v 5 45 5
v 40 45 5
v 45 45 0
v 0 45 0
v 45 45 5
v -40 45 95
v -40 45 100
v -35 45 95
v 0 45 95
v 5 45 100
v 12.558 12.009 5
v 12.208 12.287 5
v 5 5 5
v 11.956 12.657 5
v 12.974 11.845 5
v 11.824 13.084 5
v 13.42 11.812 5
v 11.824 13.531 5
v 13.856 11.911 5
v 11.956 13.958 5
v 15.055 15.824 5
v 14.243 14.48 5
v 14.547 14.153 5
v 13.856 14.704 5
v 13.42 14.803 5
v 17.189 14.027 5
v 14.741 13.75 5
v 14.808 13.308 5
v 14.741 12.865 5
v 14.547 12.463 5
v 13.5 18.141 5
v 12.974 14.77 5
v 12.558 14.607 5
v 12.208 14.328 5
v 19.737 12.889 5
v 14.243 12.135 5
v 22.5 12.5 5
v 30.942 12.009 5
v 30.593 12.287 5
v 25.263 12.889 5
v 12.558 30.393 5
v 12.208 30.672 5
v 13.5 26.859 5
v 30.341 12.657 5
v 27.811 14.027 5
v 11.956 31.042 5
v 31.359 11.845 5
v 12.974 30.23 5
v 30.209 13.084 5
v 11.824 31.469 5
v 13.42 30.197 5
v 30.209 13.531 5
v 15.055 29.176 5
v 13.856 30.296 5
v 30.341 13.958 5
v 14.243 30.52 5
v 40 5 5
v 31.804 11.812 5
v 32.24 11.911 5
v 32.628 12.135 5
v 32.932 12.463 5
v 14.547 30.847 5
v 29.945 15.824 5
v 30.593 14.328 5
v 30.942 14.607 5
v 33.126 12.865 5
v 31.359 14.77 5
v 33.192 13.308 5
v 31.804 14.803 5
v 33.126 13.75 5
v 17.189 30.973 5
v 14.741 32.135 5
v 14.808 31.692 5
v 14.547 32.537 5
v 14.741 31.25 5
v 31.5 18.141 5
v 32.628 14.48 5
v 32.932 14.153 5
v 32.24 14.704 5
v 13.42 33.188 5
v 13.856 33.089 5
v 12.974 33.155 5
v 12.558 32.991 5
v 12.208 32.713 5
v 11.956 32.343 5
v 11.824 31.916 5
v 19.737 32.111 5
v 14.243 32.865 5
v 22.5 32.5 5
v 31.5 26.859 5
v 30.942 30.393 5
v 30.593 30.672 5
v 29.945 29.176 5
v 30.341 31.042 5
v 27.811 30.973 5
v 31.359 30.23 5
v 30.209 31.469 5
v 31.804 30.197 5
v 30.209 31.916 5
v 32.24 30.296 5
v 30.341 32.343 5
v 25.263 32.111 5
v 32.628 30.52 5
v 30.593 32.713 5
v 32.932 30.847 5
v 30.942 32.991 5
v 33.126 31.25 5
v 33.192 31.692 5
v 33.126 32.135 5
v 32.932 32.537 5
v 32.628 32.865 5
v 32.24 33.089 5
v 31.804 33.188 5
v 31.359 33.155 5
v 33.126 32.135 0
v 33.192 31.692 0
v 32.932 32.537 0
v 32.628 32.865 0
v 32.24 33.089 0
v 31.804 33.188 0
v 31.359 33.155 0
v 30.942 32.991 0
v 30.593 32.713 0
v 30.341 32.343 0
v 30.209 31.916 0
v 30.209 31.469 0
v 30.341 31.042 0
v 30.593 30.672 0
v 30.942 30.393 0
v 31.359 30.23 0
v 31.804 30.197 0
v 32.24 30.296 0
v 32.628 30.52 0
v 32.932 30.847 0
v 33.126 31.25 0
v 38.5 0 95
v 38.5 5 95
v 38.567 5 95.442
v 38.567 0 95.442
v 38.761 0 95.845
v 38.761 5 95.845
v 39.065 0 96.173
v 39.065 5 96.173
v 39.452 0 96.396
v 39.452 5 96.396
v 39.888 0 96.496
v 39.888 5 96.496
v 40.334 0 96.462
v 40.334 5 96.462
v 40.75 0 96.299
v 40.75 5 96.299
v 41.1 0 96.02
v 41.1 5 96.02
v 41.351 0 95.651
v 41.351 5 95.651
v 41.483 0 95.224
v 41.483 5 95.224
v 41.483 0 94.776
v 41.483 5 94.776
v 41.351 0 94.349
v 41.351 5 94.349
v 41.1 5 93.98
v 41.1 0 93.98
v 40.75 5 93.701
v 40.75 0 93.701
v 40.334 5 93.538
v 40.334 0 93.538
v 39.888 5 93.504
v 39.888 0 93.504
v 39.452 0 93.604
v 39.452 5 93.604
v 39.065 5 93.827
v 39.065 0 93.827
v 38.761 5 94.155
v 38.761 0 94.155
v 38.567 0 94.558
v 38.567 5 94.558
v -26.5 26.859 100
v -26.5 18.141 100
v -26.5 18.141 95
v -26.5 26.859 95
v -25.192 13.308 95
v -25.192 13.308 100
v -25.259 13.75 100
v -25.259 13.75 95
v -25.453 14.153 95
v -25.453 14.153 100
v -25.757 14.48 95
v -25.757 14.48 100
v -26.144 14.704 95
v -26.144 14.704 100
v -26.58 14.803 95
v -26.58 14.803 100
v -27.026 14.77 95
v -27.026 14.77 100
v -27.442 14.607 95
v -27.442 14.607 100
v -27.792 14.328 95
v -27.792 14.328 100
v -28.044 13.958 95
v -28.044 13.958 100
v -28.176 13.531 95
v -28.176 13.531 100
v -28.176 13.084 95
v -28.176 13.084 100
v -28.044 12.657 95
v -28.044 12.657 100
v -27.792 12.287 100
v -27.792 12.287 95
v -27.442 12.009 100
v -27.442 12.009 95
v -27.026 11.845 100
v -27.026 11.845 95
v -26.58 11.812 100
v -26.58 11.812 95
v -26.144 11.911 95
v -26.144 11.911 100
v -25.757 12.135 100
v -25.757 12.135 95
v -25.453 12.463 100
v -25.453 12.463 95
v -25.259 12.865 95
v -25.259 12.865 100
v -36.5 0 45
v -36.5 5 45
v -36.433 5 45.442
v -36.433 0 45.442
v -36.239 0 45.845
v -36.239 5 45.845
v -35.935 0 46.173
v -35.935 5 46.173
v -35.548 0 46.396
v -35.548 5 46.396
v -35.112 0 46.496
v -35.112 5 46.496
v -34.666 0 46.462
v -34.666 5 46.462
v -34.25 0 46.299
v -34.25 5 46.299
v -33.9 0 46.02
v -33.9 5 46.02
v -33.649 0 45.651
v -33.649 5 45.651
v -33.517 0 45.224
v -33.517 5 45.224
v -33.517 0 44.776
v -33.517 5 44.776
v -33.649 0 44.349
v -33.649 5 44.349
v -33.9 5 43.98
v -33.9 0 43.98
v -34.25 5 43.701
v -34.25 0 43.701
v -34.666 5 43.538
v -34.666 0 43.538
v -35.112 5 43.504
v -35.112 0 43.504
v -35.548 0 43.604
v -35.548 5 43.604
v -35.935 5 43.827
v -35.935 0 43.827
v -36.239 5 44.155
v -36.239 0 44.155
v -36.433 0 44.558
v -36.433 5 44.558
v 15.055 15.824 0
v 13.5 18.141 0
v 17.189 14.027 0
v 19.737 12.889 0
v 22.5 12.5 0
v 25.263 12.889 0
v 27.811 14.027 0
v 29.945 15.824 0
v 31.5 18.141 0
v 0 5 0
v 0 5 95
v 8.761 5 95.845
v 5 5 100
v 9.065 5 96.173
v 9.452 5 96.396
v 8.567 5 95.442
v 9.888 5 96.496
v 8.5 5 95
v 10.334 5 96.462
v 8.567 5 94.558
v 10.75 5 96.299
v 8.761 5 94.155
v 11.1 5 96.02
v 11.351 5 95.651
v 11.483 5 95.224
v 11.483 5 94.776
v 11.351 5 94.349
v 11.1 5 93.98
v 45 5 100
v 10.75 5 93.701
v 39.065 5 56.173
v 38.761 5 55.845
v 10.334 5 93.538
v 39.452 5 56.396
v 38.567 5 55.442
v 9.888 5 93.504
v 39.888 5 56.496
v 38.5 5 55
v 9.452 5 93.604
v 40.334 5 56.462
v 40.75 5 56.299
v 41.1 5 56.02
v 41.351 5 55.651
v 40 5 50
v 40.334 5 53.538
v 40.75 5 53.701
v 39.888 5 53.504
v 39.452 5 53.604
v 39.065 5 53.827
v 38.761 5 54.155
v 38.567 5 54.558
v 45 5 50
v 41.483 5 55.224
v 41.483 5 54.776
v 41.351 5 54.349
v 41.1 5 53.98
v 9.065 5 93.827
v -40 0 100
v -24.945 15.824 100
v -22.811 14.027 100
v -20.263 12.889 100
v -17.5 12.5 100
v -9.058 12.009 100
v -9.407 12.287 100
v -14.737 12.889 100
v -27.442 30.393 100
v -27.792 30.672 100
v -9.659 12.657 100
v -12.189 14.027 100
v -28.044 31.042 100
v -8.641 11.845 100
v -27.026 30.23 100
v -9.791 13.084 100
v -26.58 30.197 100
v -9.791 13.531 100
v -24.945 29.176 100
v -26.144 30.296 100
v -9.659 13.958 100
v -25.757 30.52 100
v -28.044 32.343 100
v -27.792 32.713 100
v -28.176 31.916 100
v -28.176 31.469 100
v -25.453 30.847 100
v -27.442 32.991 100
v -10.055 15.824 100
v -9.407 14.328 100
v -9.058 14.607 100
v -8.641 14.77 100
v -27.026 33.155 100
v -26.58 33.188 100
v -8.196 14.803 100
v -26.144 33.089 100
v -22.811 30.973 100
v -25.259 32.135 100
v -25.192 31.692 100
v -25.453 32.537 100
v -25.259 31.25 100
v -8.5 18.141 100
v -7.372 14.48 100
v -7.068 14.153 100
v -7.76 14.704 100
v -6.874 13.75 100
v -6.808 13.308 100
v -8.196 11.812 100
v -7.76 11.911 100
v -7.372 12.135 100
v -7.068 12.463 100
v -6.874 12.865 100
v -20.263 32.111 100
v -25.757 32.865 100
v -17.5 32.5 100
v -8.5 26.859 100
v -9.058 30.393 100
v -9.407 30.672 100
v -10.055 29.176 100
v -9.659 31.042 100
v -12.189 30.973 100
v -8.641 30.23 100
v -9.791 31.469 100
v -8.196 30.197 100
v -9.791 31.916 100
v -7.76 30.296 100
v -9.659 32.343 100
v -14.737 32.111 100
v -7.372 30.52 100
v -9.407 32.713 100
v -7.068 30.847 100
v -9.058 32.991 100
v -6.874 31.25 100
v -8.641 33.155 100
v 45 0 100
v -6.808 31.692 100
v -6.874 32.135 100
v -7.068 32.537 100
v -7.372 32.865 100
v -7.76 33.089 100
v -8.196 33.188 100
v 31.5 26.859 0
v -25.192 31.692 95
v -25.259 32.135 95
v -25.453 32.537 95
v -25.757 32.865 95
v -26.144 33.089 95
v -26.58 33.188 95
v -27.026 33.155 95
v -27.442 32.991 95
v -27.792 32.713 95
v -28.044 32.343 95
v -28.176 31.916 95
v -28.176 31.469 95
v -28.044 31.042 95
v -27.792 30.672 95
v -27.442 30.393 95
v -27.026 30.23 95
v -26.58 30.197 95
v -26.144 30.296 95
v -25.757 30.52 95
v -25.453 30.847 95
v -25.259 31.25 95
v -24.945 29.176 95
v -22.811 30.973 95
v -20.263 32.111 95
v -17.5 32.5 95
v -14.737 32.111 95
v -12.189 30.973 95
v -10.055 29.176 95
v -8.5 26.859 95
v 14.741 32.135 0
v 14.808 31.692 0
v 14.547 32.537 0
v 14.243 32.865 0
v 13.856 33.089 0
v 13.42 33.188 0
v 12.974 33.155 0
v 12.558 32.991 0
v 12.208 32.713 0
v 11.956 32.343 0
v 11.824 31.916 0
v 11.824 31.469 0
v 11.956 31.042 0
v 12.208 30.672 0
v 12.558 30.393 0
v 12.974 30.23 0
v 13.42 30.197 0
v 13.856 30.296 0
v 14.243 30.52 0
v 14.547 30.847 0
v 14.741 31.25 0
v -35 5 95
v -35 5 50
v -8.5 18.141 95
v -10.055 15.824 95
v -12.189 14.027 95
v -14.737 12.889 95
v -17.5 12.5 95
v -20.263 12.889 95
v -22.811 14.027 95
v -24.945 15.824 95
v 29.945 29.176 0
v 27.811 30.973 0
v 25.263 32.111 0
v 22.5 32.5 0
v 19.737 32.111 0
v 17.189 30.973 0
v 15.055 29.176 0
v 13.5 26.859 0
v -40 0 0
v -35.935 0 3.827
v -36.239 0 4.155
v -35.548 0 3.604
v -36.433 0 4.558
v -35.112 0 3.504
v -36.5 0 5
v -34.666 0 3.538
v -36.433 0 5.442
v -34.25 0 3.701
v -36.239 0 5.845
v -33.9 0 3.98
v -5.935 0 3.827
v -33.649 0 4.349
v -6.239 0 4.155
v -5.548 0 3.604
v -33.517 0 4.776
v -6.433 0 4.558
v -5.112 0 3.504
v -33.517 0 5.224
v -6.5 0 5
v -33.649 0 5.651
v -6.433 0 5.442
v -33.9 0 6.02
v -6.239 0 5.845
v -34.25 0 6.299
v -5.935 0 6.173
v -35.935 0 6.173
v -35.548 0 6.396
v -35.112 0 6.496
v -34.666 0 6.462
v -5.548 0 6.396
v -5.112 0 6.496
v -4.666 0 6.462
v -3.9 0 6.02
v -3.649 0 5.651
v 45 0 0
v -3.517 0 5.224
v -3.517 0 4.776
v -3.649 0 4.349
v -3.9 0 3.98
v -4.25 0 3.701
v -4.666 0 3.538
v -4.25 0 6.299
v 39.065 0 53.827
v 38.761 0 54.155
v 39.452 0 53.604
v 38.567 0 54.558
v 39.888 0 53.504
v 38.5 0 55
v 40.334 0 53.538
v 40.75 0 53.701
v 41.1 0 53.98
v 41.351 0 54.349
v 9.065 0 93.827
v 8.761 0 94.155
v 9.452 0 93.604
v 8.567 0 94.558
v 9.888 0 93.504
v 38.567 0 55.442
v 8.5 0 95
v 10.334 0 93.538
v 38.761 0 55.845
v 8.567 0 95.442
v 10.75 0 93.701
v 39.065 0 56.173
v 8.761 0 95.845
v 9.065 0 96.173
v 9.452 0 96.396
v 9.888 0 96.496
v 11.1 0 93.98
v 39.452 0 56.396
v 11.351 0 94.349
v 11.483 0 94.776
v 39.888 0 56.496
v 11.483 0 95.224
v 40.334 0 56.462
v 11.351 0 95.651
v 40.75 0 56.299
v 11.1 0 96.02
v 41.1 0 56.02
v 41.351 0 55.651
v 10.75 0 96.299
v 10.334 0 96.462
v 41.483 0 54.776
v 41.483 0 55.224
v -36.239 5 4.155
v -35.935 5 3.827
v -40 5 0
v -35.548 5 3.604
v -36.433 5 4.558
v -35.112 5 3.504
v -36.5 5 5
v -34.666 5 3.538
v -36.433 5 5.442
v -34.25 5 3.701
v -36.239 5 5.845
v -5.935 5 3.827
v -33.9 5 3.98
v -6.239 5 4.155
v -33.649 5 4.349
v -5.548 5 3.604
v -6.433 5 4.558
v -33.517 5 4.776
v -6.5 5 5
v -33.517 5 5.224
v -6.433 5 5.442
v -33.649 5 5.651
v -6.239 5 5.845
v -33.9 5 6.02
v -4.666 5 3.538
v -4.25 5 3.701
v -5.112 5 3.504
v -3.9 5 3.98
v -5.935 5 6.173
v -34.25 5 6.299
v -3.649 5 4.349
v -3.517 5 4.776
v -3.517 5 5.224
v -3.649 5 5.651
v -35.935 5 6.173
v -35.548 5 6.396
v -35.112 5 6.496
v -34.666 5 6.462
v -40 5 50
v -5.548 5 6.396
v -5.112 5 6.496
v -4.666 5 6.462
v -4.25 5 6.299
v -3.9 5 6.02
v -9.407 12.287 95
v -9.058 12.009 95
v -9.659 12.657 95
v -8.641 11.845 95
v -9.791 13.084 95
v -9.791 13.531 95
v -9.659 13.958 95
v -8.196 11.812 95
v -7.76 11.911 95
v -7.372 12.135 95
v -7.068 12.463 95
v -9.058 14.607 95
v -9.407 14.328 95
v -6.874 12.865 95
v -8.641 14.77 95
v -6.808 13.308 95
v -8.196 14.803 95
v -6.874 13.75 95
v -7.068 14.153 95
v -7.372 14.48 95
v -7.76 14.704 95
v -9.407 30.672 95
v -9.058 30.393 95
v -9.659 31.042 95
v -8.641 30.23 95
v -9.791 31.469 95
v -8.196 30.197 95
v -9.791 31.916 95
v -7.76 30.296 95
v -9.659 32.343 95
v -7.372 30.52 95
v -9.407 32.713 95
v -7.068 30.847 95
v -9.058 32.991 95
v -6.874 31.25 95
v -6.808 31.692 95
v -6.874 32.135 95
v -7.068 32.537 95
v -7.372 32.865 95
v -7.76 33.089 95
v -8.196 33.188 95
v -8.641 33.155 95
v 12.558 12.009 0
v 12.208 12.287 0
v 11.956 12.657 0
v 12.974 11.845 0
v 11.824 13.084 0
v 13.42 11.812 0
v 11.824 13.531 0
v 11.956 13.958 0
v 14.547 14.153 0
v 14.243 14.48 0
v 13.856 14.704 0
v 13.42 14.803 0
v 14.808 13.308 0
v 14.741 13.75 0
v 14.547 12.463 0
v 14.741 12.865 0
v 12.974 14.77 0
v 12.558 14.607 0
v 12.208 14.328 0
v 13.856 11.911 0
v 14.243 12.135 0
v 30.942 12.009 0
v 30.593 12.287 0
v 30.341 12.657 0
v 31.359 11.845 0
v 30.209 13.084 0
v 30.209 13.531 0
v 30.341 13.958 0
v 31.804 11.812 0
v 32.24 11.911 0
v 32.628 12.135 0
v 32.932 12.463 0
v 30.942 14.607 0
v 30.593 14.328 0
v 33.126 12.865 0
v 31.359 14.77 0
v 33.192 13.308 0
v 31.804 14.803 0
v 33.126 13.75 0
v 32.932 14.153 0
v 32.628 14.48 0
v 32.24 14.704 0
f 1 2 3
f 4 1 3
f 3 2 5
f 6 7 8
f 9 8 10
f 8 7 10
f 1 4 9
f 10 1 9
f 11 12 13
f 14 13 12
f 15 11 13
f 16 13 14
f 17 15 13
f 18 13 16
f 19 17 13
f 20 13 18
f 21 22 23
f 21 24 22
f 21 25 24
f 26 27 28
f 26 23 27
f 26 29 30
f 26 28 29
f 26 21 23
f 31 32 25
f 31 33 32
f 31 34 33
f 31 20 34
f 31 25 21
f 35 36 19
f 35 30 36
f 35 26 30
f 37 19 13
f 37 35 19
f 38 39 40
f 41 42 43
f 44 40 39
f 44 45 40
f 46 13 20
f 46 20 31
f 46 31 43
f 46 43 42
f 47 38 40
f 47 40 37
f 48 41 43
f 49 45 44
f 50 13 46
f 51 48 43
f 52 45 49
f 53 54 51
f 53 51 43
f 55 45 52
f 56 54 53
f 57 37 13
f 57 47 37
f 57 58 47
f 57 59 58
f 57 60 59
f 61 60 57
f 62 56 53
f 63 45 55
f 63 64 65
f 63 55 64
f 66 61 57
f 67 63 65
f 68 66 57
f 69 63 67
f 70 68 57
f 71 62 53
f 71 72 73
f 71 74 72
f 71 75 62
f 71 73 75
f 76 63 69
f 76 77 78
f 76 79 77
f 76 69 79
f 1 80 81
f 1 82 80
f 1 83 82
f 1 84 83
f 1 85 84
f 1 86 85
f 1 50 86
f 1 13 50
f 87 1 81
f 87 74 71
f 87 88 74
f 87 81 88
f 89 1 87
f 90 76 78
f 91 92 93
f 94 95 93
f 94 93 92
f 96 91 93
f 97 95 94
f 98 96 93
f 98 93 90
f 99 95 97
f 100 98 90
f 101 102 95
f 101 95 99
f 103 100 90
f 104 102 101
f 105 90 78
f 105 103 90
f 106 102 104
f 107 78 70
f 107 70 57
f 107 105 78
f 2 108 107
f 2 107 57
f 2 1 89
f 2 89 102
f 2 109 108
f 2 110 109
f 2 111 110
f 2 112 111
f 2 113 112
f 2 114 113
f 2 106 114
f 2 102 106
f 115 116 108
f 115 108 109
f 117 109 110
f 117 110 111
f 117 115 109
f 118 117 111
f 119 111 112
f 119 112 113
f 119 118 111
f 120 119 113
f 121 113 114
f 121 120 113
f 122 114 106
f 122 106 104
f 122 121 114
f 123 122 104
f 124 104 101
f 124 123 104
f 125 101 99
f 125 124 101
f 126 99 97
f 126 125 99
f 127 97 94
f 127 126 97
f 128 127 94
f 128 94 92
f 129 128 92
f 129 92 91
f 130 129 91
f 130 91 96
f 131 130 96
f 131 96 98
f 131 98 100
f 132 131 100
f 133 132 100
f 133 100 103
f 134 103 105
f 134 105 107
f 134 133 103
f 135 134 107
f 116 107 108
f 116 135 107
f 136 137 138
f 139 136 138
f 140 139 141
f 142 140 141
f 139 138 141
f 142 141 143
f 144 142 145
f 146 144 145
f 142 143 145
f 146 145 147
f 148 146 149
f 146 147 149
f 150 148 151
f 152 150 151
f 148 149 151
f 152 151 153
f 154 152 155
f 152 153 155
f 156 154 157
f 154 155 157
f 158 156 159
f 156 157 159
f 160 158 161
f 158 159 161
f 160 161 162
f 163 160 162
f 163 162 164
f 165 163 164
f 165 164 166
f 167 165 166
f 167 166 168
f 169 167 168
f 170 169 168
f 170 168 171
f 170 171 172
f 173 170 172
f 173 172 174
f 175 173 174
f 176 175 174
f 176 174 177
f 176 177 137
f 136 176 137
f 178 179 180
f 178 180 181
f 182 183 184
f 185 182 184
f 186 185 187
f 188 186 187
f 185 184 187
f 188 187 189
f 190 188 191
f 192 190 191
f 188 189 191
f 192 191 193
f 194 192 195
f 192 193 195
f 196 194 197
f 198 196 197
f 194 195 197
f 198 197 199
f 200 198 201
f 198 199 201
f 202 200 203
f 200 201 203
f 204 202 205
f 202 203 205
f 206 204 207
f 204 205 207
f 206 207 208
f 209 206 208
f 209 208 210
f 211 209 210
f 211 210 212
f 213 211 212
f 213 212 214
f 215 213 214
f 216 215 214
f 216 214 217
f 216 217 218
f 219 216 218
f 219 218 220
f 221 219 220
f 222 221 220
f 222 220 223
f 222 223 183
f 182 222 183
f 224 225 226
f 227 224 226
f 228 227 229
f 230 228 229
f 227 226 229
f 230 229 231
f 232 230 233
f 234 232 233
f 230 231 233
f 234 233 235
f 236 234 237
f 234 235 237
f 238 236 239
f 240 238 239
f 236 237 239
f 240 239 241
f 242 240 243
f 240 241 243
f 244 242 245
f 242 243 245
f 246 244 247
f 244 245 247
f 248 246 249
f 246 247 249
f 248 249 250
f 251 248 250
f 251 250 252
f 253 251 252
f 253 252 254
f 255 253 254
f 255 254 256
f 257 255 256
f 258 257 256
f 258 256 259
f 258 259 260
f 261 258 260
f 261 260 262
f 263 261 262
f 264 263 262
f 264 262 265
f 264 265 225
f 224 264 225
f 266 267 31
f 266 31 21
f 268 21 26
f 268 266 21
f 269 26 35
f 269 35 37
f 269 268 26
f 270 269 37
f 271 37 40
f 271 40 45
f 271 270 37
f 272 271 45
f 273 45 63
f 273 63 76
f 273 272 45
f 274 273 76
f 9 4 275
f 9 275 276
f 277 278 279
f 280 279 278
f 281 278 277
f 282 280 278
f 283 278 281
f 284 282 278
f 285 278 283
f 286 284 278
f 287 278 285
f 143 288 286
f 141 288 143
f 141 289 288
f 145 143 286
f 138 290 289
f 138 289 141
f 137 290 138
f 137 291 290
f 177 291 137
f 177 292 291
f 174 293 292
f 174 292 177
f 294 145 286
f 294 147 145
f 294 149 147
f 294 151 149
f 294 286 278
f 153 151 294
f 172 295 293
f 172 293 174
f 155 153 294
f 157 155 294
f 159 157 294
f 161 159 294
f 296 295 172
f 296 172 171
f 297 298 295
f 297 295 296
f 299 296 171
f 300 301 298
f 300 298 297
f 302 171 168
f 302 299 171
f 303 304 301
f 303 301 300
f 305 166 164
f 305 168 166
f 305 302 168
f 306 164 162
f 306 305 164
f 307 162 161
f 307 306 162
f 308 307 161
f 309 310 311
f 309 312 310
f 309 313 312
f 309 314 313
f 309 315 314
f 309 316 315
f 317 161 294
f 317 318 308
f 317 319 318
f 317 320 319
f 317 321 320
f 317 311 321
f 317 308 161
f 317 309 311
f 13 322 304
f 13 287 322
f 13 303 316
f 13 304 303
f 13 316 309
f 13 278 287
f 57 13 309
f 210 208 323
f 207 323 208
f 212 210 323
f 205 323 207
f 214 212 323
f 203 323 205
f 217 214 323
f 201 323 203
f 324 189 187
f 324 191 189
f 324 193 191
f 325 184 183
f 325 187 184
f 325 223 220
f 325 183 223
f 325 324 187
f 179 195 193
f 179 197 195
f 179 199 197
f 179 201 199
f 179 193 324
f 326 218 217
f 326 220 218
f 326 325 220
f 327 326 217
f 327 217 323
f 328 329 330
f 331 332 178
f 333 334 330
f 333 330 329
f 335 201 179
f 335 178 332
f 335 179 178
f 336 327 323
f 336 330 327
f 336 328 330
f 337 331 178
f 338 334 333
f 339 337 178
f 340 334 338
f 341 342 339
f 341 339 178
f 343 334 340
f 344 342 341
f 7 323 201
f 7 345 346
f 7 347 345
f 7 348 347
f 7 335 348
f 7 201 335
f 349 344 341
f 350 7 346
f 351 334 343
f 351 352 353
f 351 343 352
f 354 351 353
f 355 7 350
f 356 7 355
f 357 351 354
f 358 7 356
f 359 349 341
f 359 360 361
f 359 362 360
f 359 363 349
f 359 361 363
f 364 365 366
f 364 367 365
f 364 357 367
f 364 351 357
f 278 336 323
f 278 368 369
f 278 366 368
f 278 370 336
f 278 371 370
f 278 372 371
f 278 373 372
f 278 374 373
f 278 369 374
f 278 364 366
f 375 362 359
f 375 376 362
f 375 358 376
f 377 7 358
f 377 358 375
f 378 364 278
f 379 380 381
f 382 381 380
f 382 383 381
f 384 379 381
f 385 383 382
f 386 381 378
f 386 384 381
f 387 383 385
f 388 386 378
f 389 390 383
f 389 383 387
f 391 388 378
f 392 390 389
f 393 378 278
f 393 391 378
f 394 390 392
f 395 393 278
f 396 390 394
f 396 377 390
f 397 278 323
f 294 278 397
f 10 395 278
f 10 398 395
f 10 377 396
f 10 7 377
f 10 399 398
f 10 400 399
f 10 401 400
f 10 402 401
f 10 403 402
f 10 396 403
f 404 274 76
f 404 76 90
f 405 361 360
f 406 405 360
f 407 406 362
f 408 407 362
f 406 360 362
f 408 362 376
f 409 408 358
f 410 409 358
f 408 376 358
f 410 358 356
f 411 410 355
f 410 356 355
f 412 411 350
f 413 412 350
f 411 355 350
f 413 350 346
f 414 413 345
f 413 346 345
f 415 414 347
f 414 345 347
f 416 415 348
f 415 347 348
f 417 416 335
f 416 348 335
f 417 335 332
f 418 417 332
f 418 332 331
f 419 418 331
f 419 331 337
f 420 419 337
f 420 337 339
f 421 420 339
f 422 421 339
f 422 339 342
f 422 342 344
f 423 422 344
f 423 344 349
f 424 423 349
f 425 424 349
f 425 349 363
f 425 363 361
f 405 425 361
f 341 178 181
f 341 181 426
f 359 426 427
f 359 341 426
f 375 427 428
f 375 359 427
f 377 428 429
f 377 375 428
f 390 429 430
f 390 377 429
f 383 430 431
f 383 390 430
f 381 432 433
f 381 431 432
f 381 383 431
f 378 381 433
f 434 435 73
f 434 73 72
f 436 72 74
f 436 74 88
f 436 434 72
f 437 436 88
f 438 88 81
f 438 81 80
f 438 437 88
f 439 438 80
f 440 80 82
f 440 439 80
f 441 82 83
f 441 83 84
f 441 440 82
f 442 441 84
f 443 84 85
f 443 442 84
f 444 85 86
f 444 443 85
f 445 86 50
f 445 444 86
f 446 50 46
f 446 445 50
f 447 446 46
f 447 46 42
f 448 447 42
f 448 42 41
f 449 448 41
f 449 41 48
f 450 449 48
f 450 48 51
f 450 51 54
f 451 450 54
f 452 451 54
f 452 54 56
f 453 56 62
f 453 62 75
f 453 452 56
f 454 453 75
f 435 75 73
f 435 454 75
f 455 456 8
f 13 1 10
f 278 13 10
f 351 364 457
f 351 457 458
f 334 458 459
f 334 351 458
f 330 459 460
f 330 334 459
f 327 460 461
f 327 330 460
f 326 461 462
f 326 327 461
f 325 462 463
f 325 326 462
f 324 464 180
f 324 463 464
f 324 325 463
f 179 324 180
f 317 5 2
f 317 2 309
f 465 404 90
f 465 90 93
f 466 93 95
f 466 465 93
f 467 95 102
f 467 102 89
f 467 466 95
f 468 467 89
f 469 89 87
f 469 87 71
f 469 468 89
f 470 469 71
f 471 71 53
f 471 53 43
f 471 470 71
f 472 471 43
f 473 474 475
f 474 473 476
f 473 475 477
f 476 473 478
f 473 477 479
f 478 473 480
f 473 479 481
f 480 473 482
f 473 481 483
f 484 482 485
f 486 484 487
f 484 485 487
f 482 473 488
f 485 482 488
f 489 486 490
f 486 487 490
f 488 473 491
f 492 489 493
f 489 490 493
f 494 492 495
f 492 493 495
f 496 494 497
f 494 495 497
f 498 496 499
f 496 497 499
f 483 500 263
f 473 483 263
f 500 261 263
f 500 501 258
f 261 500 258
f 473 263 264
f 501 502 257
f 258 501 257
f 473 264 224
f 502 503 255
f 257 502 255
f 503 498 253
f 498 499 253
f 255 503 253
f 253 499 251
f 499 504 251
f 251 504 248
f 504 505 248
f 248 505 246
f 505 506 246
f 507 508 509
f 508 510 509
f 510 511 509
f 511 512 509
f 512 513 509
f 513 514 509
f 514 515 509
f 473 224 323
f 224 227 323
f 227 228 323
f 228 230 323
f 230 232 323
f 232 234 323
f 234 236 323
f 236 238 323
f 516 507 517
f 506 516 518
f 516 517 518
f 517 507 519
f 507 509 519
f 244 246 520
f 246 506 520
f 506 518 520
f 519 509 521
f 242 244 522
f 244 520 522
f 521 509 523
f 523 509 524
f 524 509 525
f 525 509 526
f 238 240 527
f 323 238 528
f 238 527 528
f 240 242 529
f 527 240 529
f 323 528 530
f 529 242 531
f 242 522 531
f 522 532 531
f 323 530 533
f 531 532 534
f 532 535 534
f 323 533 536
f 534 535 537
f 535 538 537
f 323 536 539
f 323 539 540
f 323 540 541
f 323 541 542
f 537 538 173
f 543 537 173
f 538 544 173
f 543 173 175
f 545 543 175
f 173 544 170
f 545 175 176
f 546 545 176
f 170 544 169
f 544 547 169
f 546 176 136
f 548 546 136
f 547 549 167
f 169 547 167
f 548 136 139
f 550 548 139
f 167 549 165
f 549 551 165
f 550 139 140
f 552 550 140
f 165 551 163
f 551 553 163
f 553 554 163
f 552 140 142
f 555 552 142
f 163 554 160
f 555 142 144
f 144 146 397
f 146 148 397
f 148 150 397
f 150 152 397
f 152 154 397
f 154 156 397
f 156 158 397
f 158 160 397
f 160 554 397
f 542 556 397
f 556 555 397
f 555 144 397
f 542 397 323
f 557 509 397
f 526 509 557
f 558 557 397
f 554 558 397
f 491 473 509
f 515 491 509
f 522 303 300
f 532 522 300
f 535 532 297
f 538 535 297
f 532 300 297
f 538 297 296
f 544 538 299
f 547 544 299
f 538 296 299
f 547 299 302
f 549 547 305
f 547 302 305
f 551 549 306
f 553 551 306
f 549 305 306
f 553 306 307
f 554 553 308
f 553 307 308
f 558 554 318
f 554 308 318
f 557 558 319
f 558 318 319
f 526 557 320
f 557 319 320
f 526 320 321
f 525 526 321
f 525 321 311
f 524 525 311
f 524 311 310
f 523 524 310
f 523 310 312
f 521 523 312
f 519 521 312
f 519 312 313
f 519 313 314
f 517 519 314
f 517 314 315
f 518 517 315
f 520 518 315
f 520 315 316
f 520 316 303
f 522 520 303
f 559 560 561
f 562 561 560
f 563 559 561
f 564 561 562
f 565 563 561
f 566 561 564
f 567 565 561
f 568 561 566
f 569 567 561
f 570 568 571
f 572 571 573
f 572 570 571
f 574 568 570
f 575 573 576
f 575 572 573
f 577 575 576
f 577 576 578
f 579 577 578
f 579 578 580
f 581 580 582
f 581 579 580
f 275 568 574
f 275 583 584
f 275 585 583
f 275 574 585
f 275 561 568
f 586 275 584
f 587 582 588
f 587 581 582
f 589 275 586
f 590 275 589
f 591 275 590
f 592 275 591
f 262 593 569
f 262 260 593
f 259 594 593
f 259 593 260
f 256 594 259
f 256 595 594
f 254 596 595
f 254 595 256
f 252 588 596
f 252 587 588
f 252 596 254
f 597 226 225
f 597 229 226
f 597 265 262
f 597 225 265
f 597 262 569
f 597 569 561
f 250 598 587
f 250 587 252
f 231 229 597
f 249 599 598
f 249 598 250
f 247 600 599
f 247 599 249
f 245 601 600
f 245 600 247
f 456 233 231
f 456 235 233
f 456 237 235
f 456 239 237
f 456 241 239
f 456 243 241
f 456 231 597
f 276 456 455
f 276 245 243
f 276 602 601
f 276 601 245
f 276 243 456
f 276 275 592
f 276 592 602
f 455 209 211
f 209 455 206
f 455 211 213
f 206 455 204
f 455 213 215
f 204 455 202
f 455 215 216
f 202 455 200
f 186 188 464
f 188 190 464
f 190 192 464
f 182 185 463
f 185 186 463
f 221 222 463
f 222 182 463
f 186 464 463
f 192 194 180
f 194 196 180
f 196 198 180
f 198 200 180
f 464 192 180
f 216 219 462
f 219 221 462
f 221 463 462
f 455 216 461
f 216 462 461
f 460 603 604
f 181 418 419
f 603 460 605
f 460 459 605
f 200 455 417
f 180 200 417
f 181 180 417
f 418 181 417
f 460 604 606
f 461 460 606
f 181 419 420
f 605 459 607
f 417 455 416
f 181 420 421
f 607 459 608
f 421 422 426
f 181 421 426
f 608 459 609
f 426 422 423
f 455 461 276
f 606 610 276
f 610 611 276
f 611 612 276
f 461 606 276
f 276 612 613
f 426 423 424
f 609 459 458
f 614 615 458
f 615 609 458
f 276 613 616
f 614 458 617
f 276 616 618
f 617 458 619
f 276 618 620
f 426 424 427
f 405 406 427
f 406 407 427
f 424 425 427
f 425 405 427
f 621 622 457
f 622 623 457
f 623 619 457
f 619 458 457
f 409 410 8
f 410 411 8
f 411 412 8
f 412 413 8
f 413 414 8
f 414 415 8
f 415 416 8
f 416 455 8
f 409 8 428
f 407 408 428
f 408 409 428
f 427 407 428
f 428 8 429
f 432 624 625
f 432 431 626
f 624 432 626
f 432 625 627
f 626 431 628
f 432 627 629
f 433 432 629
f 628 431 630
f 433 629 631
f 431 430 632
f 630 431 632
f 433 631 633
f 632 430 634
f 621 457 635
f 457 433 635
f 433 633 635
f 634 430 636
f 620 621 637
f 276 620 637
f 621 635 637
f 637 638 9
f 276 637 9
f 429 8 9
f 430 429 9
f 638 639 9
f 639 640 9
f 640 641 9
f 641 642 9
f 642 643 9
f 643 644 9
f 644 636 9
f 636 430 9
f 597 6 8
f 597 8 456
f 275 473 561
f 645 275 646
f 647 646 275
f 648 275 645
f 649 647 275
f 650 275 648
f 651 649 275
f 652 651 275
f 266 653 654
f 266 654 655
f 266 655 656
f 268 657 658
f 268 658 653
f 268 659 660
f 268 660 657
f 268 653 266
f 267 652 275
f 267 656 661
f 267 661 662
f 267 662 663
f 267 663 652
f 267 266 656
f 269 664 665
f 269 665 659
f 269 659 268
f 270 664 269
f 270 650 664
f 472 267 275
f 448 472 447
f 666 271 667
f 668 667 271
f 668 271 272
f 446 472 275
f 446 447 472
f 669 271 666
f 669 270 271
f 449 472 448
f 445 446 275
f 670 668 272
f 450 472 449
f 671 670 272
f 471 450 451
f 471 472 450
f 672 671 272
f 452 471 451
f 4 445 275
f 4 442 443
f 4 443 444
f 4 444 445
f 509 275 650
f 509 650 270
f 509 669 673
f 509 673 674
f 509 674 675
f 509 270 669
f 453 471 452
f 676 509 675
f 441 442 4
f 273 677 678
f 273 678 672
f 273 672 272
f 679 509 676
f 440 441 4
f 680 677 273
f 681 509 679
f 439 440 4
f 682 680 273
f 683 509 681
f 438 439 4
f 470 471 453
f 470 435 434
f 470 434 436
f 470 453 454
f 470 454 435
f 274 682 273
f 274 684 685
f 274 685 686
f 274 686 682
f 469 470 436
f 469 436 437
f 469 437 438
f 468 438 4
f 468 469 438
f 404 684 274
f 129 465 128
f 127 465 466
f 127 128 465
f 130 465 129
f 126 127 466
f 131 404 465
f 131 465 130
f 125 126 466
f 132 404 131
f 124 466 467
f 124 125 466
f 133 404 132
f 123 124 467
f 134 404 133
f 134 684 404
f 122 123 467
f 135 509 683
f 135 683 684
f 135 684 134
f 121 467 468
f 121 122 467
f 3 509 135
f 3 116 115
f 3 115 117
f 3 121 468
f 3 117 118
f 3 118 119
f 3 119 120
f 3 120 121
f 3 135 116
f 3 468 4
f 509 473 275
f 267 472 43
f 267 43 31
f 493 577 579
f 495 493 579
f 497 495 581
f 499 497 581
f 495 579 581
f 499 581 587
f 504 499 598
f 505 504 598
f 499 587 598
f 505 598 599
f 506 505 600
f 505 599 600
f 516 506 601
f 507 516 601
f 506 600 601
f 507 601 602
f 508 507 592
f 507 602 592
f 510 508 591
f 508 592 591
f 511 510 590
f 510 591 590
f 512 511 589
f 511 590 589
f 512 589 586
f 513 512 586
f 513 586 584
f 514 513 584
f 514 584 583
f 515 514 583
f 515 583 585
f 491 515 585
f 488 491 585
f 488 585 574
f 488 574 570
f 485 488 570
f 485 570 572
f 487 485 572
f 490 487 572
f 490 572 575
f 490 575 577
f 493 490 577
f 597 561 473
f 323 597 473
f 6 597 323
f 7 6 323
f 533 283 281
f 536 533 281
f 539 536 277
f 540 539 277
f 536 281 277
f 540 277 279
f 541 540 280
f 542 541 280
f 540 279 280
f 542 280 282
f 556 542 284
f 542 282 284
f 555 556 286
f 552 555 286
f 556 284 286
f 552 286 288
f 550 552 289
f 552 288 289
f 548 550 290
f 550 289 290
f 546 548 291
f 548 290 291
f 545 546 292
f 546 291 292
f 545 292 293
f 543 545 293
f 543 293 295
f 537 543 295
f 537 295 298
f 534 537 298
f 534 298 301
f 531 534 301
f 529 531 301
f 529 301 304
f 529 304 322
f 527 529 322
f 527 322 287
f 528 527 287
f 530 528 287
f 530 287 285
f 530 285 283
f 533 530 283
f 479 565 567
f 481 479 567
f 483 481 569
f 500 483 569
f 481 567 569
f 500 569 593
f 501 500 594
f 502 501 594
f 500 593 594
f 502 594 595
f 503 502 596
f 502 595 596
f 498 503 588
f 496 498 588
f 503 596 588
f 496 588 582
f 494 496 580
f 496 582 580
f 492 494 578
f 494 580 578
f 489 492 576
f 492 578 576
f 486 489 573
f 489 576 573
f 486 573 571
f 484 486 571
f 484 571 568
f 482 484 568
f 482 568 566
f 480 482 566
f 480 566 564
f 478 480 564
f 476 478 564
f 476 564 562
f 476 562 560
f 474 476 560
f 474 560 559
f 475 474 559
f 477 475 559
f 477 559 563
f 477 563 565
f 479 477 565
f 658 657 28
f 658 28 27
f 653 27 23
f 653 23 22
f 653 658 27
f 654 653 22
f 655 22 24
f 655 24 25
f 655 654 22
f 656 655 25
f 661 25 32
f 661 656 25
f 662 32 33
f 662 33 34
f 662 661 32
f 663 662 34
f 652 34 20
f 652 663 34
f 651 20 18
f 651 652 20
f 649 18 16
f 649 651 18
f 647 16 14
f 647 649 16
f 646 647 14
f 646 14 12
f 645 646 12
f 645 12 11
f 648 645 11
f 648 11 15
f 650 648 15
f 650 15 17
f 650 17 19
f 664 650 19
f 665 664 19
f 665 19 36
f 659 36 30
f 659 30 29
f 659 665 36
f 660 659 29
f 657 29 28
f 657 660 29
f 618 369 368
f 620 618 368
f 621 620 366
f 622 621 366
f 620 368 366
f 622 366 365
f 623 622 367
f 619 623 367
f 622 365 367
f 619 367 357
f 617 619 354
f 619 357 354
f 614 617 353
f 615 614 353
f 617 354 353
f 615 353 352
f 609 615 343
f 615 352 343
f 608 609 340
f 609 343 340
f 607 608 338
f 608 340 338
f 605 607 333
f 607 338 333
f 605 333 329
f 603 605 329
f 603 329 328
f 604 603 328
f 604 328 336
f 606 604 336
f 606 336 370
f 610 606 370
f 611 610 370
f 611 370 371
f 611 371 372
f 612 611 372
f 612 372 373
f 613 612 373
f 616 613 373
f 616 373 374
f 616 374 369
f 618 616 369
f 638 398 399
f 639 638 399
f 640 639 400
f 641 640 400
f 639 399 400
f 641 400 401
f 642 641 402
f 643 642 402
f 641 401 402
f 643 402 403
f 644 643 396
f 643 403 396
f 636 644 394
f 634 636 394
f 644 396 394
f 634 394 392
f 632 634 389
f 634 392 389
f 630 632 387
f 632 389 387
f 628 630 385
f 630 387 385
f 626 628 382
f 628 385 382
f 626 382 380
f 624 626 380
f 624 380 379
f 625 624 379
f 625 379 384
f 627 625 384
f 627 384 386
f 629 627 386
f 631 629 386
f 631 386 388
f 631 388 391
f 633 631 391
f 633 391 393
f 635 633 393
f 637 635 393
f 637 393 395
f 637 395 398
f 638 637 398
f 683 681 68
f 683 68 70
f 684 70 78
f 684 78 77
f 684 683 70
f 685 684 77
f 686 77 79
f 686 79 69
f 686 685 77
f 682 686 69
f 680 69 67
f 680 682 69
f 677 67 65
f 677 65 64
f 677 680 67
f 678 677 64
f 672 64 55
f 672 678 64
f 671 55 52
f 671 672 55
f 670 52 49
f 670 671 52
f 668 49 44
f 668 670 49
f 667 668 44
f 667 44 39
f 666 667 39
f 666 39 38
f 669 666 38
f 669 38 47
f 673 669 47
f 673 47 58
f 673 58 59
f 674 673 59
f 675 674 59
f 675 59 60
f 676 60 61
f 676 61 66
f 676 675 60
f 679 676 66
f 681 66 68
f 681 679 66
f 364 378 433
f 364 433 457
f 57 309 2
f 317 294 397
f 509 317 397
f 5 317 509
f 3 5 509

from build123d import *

# Parameters (mm, degrees)
ESQUISSE1_W             = 45
ESQUISSE1_H             = 45
ESQUISSE1_R             = 1.5
EXTRUSION1_DEPTH        = 5
ESQUISSE2_W             = 45
ESQUISSE2_H             = 5
EXTRUSION2_DEPTH        = 95
EXTRUSION3_DEPTH        = 5
ESQUISSE4_W             = 95
ESQUISSE4_H             = 40
EXTRUSION4_DEPTH        = 5
ESQUISSE5_W             = 100
ESQUISSE5_H             = 5
EXTRUSION5_DEPTH        = 40
ESQUISSE6_W             = 40
ESQUISSE6_H             = 40
EXTRUSION6_DEPTH        = 5
EXTRUSION7_DEPTH        = 5
ENL_V_MAT_EXTRU_1_REACH = 102
ESQUISSE8_R             = 1.5
ENL_V_MAT_EXTRU_2_REACH = 7
ESQUISSE9_R             = 1.5


with BuildPart() as part:
    # Esquisse1 → Extrusion1 (new body)
    with BuildSketch(Plane.XY):
        with Locations((22.5, 22.5)):
            Rectangle(ESQUISSE1_W, ESQUISSE1_H)
        with Locations((31.692388155, 31.692388155)):
            Circle(ESQUISSE1_R, mode=Mode.SUBTRACT)
        with Locations((31.692388155, 13.307611845)):
            Circle(ESQUISSE1_R, mode=Mode.SUBTRACT)
        with Locations((13.307611845, 13.307611845)):
            Circle(ESQUISSE1_R, mode=Mode.SUBTRACT)
        with Locations((13.307611845, 31.692388155)):
            Circle(ESQUISSE1_R, mode=Mode.SUBTRACT)
        with BuildLine():
            Line((13.5, 26.858898944), (13.5, 18.141101056))
            ThreePointArc((13.5, 18.141101056), (22.5, 12.5), (31.5, 18.141101056))
            Line((31.5, 18.141101056), (31.5, 26.858898944))
            ThreePointArc((31.5, 26.858898944), (22.5, 32.5), (13.5, 26.858898944))
        make_face(mode=Mode.SUBTRACT)
    extrude(amount=EXTRUSION1_DEPTH)

    # Esquisse2 → Extrusion2 (add)
    with BuildSketch(Plane.XY.offset(5)):
        with Locations((22.5, 2.5)):
            Rectangle(ESQUISSE2_W, ESQUISSE2_H)
    extrude(amount=EXTRUSION2_DEPTH)

    # Esquisse3 → Extrusion3 (add)
    with BuildSketch(Plane(origin=(45, 0, 0), x_dir=(0, 0, -1), z_dir=(1, 0, 0))):
        Polygon((-5, 5), (-5, 45), (-50, 5), align=None)
    extrude(amount=-EXTRUSION3_DEPTH)

    # Esquisse4 → Extrusion4 (add)
    with BuildSketch(Plane.ZY):
        with Locations((52.5, 25)):
            Rectangle(ESQUISSE4_W, ESQUISSE4_H)
    extrude(amount=-EXTRUSION4_DEPTH)

    # Esquisse5 → Extrusion5 (add)
    with BuildSketch(Plane.ZY):
        with Locations((50, 2.5)):
            Rectangle(ESQUISSE5_W, ESQUISSE5_H)
    extrude(amount=EXTRUSION5_DEPTH)

    # Esquisse6 → Extrusion6 (add)
    with BuildSketch(Plane.XY.offset(100)):
        with Locations((-20, 25)):
            Rectangle(ESQUISSE6_W, ESQUISSE6_H)
    extrude(amount=-EXTRUSION6_DEPTH)

    # Esquisse7 → Extrusion7 (add)
    with BuildSketch(Plane.ZY.offset(40)):
        Polygon((95, 5), (95, 45), (50, 5), align=None)
    extrude(amount=-EXTRUSION7_DEPTH)

    # Esquisse8 → Enlèv. mat.-Extru.1 (cut, up to next)
    with BuildSketch(Plane.XY.offset(100), mode=Mode.PRIVATE) as enl_v_mat_extru_1_sk1:
        with Locations((-26.692388155, 31.692388155)):
            Circle(ESQUISSE8_R)
    enl_v_mat_extru_1_tool1 = extrude(enl_v_mat_extru_1_sk1.sketch, amount=-ENL_V_MAT_EXTRU_1_REACH, mode=Mode.PRIVATE) & part.part
    add(enl_v_mat_extru_1_tool1.solids().sort_by_distance((-26.692388, 31.692388, 100))[0], mode=Mode.SUBTRACT)
    # Esquisse8 → Enlèv. mat.-Extru.1 (cut, up to next)
    with BuildSketch(Plane.XY.offset(100), mode=Mode.PRIVATE) as enl_v_mat_extru_1_sk2:
        with Locations((-26.692388155, 13.307611845)):
            Circle(ESQUISSE8_R)
    enl_v_mat_extru_1_tool2 = extrude(enl_v_mat_extru_1_sk2.sketch, amount=-ENL_V_MAT_EXTRU_1_REACH, mode=Mode.PRIVATE) & part.part
    add(enl_v_mat_extru_1_tool2.solids().sort_by_distance((-26.692388, 13.307612, 100))[0], mode=Mode.SUBTRACT)
    # Esquisse8 → Enlèv. mat.-Extru.1 (cut, up to next)
    with BuildSketch(Plane.XY.offset(100), mode=Mode.PRIVATE) as enl_v_mat_extru_1_sk3:
        with Locations((-8.307611845, 13.307611845)):
            Circle(ESQUISSE8_R)
    enl_v_mat_extru_1_tool3 = extrude(enl_v_mat_extru_1_sk3.sketch, amount=-ENL_V_MAT_EXTRU_1_REACH, mode=Mode.PRIVATE) & part.part
    add(enl_v_mat_extru_1_tool3.solids().sort_by_distance((-8.307612, 13.307612, 100))[0], mode=Mode.SUBTRACT)
    # Esquisse8 → Enlèv. mat.-Extru.1 (cut, up to next)
    with BuildSketch(Plane.XY.offset(100), mode=Mode.PRIVATE) as enl_v_mat_extru_1_sk4:
        with Locations((-8.307611845, 31.692388155)):
            Circle(ESQUISSE8_R)
    enl_v_mat_extru_1_tool4 = extrude(enl_v_mat_extru_1_sk4.sketch, amount=-ENL_V_MAT_EXTRU_1_REACH, mode=Mode.PRIVATE) & part.part
    add(enl_v_mat_extru_1_tool4.solids().sort_by_distance((-8.307612, 31.692388, 100))[0], mode=Mode.SUBTRACT)
    # Esquisse8 → Enlèv. mat.-Extru.1 (cut, up to next)
    with BuildSketch(Plane.XY.offset(100), mode=Mode.PRIVATE) as enl_v_mat_extru_1_sk5:
        with BuildLine():
            Line((-26.5, 18.141101056), (-26.5, 26.858898944))
            ThreePointArc((-26.5, 26.858898944), (-17.5, 32.5), (-8.5, 26.858898944))
            Line((-8.5, 26.858898944), (-8.5, 18.141101056))
            ThreePointArc((-8.5, 18.141101056), (-17.5, 12.5), (-26.5, 18.141101056))
        make_face()
    enl_v_mat_extru_1_tool5 = extrude(enl_v_mat_extru_1_sk5.sketch, amount=-ENL_V_MAT_EXTRU_1_REACH, mode=Mode.PRIVATE) & part.part
    add(enl_v_mat_extru_1_tool5.solids().sort_by_distance((-17.5, 22.5, 100))[0], mode=Mode.SUBTRACT)

    # Esquisse9 → Enlèv. mat.-Extru.2 (cut, up to next)
    with BuildSketch(Plane(origin=(0, 5, 0), x_dir=(-1, 0, 0), z_dir=(0, 1, 0)), mode=Mode.PRIVATE) as enl_v_mat_extru_2_sk1:
        with Locations((-40, 95)):
            Circle(ESQUISSE9_R)
    enl_v_mat_extru_2_tool1 = extrude(enl_v_mat_extru_2_sk1.sketch, amount=-ENL_V_MAT_EXTRU_2_REACH, mode=Mode.PRIVATE) & part.part
    add(enl_v_mat_extru_2_tool1.solids().sort_by_distance((40, 5, 95))[0], mode=Mode.SUBTRACT)
    # Esquisse9 → Enlèv. mat.-Extru.2 (cut, up to next)
    with BuildSketch(Plane(origin=(0, 5, 0), x_dir=(-1, 0, 0), z_dir=(0, 1, 0)), mode=Mode.PRIVATE) as enl_v_mat_extru_2_sk2:
        with Locations((-10, 95)):
            Circle(ESQUISSE9_R)
    enl_v_mat_extru_2_tool2 = extrude(enl_v_mat_extru_2_sk2.sketch, amount=-ENL_V_MAT_EXTRU_2_REACH, mode=Mode.PRIVATE) & part.part
    add(enl_v_mat_extru_2_tool2.solids().sort_by_distance((10, 5, 95))[0], mode=Mode.SUBTRACT)
    # Esquisse9 → Enlèv. mat.-Extru.2 (cut, up to next)
    with BuildSketch(Plane(origin=(0, 5, 0), x_dir=(-1, 0, 0), z_dir=(0, 1, 0)), mode=Mode.PRIVATE) as enl_v_mat_extru_2_sk3:
        with Locations((35, 5)):
            Circle(ESQUISSE9_R)
    enl_v_mat_extru_2_tool3 = extrude(enl_v_mat_extru_2_sk3.sketch, amount=-ENL_V_MAT_EXTRU_2_REACH, mode=Mode.PRIVATE) & part.part
    add(enl_v_mat_extru_2_tool3.solids().sort_by_distance((-35, 5, 5))[0], mode=Mode.SUBTRACT)
    # Esquisse9 → Enlèv. mat.-Extru.2 (cut, up to next)
    with BuildSketch(Plane(origin=(0, 5, 0), x_dir=(-1, 0, 0), z_dir=(0, 1, 0)), mode=Mode.PRIVATE) as enl_v_mat_extru_2_sk4:
        with Locations((5, 5)):
            Circle(ESQUISSE9_R)
    enl_v_mat_extru_2_tool4 = extrude(enl_v_mat_extru_2_sk4.sketch, amount=-ENL_V_MAT_EXTRU_2_REACH, mode=Mode.PRIVATE) & part.part
    add(enl_v_mat_extru_2_tool4.solids().sort_by_distance((-5, 5, 5))[0], mode=Mode.SUBTRACT)
    # Esquisse9 → Enlèv. mat.-Extru.2 (cut, up to next)
    with BuildSketch(Plane(origin=(0, 5, 0), x_dir=(-1, 0, 0), z_dir=(0, 1, 0)), mode=Mode.PRIVATE) as enl_v_mat_extru_2_sk5:
        with Locations((-40, 55)):
            Circle(ESQUISSE9_R)
    enl_v_mat_extru_2_tool5 = extrude(enl_v_mat_extru_2_sk5.sketch, amount=-ENL_V_MAT_EXTRU_2_REACH, mode=Mode.PRIVATE) & part.part
    add(enl_v_mat_extru_2_tool5.solids().sort_by_distance((40, 5, 55))[0], mode=Mode.SUBTRACT)
    # Esquisse9 → Enlèv. mat.-Extru.2 (cut, up to next)
    with BuildSketch(Plane(origin=(0, 5, 0), x_dir=(-1, 0, 0), z_dir=(0, 1, 0)), mode=Mode.PRIVATE) as enl_v_mat_extru_2_sk6:
        with Locations((35, 45)):
            Circle(ESQUISSE9_R)
    enl_v_mat_extru_2_tool6 = extrude(enl_v_mat_extru_2_sk6.sketch, amount=-ENL_V_MAT_EXTRU_2_REACH, mode=Mode.PRIVATE) & part.part
    add(enl_v_mat_extru_2_tool6.solids().sort_by_distance((-35, 5, 45))[0], mode=Mode.SUBTRACT)


solid = part.part
